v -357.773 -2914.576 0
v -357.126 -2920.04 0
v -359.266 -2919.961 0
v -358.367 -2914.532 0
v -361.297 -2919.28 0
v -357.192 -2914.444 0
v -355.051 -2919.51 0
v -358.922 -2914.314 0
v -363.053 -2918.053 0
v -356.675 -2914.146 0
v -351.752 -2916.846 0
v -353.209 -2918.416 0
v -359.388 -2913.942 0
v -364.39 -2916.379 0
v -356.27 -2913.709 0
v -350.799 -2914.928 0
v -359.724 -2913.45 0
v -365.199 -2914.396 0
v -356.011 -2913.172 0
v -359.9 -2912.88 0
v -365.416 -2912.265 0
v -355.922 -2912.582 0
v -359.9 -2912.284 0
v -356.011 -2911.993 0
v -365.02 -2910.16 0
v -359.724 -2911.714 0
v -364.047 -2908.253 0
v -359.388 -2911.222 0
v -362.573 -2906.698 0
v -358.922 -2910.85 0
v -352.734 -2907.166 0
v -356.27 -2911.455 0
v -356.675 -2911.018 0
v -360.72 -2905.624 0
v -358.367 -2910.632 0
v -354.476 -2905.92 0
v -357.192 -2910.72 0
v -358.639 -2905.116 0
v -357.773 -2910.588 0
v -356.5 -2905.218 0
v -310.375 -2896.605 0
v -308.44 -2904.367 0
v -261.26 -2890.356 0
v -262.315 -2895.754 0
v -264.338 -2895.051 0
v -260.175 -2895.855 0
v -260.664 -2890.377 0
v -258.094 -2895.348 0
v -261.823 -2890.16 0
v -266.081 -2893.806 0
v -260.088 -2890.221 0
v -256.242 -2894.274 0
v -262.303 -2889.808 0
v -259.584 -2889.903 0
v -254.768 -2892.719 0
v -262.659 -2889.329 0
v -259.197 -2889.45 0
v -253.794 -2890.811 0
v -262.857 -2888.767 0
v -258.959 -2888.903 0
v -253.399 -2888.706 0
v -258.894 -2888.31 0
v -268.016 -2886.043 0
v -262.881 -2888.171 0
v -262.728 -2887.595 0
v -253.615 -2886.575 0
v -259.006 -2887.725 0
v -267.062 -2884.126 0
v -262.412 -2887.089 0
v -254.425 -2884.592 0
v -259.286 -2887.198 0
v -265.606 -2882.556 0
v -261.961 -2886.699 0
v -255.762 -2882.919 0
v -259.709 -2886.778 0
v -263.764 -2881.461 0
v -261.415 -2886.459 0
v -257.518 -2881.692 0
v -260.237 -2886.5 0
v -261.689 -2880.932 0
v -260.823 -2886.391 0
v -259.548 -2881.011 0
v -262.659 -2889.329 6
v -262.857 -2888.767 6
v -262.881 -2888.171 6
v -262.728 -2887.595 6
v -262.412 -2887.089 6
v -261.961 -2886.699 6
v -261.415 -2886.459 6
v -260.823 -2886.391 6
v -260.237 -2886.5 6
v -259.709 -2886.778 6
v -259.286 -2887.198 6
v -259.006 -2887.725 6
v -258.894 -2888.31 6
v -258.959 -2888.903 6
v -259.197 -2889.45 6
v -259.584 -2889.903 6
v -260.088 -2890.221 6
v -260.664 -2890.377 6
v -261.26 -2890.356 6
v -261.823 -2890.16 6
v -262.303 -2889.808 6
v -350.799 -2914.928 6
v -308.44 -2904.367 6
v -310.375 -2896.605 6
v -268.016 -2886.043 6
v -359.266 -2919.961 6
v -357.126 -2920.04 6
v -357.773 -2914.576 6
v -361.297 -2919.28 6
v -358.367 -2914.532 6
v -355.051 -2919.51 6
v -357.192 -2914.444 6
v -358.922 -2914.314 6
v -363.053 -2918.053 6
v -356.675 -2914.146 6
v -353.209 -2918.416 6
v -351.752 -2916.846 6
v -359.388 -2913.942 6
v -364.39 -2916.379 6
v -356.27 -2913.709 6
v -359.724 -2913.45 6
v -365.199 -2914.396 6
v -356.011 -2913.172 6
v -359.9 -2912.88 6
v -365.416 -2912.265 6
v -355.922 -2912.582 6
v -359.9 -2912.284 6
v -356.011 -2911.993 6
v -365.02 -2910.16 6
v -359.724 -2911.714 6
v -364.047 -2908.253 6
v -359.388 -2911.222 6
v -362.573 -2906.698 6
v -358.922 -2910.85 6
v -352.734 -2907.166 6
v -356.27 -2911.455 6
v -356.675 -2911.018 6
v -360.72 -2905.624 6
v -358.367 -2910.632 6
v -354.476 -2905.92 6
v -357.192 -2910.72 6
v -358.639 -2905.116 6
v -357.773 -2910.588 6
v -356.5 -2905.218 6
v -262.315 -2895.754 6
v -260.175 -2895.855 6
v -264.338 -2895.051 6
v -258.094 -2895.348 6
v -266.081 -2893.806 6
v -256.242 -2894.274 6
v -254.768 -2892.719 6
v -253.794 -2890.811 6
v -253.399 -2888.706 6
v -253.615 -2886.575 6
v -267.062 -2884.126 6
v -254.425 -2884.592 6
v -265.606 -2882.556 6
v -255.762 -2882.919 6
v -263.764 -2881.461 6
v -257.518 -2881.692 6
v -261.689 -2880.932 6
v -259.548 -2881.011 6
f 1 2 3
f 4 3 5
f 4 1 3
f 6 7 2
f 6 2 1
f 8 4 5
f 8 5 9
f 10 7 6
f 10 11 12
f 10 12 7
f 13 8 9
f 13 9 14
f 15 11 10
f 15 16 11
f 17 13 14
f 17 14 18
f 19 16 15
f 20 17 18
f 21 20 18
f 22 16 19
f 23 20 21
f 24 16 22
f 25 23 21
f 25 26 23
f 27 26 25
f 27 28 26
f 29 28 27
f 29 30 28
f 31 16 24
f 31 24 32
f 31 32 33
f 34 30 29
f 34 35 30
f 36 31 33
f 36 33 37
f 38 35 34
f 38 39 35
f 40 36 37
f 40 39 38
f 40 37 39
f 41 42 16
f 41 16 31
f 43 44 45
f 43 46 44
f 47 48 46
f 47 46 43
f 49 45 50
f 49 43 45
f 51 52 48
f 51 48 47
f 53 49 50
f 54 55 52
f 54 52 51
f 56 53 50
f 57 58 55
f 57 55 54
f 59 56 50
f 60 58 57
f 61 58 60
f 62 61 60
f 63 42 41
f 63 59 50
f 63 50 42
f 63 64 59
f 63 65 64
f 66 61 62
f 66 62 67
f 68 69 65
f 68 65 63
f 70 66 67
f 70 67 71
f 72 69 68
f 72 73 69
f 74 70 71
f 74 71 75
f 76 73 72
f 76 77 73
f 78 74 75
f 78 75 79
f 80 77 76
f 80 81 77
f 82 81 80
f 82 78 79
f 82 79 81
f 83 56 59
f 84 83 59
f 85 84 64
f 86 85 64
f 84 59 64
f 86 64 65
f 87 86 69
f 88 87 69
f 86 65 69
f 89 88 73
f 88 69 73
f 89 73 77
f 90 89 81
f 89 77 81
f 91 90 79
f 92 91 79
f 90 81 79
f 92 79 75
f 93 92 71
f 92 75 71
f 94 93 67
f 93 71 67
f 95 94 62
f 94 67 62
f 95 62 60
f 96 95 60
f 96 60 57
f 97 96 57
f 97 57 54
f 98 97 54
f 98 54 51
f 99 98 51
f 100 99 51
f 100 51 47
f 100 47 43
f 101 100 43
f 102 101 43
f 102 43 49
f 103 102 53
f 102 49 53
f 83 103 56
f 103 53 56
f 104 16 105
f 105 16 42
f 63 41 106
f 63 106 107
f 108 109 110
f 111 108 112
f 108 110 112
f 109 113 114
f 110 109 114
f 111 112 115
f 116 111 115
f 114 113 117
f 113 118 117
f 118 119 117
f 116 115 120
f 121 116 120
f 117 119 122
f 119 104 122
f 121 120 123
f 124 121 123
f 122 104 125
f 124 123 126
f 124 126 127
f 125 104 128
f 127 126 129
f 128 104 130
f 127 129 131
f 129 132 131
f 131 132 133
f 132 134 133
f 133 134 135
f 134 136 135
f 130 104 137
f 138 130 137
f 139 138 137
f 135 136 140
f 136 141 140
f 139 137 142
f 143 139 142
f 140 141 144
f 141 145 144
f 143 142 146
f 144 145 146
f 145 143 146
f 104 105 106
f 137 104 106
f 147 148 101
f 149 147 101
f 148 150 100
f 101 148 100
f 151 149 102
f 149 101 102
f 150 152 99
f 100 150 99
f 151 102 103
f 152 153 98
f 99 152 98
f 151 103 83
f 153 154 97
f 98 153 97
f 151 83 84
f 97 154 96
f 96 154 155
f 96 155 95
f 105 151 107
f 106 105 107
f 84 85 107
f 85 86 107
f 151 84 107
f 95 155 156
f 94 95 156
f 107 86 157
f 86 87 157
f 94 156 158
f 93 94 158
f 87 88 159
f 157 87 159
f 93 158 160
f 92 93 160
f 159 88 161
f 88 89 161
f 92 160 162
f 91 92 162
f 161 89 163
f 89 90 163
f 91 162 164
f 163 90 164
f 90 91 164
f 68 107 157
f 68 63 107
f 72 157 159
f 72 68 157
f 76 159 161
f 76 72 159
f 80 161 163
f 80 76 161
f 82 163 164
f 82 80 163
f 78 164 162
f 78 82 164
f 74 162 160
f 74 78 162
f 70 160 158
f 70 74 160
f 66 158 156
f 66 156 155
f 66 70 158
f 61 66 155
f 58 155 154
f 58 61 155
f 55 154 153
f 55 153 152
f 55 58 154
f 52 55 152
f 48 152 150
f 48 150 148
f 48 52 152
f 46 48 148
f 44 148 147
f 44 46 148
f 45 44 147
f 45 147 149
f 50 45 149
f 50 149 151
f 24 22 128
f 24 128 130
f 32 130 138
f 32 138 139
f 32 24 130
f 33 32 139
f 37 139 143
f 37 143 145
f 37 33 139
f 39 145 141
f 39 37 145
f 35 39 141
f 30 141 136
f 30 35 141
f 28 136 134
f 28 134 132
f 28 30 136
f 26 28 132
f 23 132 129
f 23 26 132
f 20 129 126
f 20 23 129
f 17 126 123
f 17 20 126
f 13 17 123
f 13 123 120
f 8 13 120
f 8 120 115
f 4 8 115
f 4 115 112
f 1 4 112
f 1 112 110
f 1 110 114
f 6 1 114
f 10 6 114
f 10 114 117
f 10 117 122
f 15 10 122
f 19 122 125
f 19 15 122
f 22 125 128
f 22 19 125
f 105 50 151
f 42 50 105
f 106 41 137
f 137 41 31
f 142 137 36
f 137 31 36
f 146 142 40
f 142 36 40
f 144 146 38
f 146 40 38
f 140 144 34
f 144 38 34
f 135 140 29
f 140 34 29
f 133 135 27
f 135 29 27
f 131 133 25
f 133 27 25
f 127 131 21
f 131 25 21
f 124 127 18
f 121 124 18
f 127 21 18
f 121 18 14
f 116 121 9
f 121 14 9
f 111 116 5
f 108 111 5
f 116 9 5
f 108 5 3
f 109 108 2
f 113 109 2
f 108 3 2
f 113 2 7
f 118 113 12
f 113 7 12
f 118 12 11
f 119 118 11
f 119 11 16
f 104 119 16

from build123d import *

# Parameters (mm, degrees)
SKETCH1_R           = 2
BOSS_EXTRUDE1_DEPTH = 6


with BuildPart() as part:
    # Sketch1 → Boss-Extrude1 (new body)
    with BuildSketch(Plane(origin=(-250.576496127, -2880.89736156, 0), x_dir=(0.2387018630194584, 0.9710929000827057, 0), z_dir=(0, 0, 1))):
        with BuildLine():
            Line((-29.52735978, 54.320605501), (-49.894496726, 92.934085733))
            ThreePointArc((-49.894496726, 92.934085733), (-59.891411997, 103.313200176), (-56.970497395, 89.201765471))
            Line((-56.970497395, 89.201765471), (-36.603360449, 50.588285239))
            Line((-36.603360449, 50.588285239), (-29.52735978, 54.320605501))
        make_face()
        with Locations((-56.392361751, 96.67944955)):
            Circle(SKETCH1_R, mode=Mode.SUBTRACT)
    extrude(amount=BOSS_EXTRUDE1_DEPTH)

    # Mirror3: part across plane


with BuildPart() as part_1:
    add(part.part)
    add(part.part.mirror(Plane(origin=(-972.146788094, -242.383417146, 6), x_dir=(0, 0, 1), z_dir=(-0.9702957262759991, -0.2419218955996574, 0))))


solid = part_1.part
